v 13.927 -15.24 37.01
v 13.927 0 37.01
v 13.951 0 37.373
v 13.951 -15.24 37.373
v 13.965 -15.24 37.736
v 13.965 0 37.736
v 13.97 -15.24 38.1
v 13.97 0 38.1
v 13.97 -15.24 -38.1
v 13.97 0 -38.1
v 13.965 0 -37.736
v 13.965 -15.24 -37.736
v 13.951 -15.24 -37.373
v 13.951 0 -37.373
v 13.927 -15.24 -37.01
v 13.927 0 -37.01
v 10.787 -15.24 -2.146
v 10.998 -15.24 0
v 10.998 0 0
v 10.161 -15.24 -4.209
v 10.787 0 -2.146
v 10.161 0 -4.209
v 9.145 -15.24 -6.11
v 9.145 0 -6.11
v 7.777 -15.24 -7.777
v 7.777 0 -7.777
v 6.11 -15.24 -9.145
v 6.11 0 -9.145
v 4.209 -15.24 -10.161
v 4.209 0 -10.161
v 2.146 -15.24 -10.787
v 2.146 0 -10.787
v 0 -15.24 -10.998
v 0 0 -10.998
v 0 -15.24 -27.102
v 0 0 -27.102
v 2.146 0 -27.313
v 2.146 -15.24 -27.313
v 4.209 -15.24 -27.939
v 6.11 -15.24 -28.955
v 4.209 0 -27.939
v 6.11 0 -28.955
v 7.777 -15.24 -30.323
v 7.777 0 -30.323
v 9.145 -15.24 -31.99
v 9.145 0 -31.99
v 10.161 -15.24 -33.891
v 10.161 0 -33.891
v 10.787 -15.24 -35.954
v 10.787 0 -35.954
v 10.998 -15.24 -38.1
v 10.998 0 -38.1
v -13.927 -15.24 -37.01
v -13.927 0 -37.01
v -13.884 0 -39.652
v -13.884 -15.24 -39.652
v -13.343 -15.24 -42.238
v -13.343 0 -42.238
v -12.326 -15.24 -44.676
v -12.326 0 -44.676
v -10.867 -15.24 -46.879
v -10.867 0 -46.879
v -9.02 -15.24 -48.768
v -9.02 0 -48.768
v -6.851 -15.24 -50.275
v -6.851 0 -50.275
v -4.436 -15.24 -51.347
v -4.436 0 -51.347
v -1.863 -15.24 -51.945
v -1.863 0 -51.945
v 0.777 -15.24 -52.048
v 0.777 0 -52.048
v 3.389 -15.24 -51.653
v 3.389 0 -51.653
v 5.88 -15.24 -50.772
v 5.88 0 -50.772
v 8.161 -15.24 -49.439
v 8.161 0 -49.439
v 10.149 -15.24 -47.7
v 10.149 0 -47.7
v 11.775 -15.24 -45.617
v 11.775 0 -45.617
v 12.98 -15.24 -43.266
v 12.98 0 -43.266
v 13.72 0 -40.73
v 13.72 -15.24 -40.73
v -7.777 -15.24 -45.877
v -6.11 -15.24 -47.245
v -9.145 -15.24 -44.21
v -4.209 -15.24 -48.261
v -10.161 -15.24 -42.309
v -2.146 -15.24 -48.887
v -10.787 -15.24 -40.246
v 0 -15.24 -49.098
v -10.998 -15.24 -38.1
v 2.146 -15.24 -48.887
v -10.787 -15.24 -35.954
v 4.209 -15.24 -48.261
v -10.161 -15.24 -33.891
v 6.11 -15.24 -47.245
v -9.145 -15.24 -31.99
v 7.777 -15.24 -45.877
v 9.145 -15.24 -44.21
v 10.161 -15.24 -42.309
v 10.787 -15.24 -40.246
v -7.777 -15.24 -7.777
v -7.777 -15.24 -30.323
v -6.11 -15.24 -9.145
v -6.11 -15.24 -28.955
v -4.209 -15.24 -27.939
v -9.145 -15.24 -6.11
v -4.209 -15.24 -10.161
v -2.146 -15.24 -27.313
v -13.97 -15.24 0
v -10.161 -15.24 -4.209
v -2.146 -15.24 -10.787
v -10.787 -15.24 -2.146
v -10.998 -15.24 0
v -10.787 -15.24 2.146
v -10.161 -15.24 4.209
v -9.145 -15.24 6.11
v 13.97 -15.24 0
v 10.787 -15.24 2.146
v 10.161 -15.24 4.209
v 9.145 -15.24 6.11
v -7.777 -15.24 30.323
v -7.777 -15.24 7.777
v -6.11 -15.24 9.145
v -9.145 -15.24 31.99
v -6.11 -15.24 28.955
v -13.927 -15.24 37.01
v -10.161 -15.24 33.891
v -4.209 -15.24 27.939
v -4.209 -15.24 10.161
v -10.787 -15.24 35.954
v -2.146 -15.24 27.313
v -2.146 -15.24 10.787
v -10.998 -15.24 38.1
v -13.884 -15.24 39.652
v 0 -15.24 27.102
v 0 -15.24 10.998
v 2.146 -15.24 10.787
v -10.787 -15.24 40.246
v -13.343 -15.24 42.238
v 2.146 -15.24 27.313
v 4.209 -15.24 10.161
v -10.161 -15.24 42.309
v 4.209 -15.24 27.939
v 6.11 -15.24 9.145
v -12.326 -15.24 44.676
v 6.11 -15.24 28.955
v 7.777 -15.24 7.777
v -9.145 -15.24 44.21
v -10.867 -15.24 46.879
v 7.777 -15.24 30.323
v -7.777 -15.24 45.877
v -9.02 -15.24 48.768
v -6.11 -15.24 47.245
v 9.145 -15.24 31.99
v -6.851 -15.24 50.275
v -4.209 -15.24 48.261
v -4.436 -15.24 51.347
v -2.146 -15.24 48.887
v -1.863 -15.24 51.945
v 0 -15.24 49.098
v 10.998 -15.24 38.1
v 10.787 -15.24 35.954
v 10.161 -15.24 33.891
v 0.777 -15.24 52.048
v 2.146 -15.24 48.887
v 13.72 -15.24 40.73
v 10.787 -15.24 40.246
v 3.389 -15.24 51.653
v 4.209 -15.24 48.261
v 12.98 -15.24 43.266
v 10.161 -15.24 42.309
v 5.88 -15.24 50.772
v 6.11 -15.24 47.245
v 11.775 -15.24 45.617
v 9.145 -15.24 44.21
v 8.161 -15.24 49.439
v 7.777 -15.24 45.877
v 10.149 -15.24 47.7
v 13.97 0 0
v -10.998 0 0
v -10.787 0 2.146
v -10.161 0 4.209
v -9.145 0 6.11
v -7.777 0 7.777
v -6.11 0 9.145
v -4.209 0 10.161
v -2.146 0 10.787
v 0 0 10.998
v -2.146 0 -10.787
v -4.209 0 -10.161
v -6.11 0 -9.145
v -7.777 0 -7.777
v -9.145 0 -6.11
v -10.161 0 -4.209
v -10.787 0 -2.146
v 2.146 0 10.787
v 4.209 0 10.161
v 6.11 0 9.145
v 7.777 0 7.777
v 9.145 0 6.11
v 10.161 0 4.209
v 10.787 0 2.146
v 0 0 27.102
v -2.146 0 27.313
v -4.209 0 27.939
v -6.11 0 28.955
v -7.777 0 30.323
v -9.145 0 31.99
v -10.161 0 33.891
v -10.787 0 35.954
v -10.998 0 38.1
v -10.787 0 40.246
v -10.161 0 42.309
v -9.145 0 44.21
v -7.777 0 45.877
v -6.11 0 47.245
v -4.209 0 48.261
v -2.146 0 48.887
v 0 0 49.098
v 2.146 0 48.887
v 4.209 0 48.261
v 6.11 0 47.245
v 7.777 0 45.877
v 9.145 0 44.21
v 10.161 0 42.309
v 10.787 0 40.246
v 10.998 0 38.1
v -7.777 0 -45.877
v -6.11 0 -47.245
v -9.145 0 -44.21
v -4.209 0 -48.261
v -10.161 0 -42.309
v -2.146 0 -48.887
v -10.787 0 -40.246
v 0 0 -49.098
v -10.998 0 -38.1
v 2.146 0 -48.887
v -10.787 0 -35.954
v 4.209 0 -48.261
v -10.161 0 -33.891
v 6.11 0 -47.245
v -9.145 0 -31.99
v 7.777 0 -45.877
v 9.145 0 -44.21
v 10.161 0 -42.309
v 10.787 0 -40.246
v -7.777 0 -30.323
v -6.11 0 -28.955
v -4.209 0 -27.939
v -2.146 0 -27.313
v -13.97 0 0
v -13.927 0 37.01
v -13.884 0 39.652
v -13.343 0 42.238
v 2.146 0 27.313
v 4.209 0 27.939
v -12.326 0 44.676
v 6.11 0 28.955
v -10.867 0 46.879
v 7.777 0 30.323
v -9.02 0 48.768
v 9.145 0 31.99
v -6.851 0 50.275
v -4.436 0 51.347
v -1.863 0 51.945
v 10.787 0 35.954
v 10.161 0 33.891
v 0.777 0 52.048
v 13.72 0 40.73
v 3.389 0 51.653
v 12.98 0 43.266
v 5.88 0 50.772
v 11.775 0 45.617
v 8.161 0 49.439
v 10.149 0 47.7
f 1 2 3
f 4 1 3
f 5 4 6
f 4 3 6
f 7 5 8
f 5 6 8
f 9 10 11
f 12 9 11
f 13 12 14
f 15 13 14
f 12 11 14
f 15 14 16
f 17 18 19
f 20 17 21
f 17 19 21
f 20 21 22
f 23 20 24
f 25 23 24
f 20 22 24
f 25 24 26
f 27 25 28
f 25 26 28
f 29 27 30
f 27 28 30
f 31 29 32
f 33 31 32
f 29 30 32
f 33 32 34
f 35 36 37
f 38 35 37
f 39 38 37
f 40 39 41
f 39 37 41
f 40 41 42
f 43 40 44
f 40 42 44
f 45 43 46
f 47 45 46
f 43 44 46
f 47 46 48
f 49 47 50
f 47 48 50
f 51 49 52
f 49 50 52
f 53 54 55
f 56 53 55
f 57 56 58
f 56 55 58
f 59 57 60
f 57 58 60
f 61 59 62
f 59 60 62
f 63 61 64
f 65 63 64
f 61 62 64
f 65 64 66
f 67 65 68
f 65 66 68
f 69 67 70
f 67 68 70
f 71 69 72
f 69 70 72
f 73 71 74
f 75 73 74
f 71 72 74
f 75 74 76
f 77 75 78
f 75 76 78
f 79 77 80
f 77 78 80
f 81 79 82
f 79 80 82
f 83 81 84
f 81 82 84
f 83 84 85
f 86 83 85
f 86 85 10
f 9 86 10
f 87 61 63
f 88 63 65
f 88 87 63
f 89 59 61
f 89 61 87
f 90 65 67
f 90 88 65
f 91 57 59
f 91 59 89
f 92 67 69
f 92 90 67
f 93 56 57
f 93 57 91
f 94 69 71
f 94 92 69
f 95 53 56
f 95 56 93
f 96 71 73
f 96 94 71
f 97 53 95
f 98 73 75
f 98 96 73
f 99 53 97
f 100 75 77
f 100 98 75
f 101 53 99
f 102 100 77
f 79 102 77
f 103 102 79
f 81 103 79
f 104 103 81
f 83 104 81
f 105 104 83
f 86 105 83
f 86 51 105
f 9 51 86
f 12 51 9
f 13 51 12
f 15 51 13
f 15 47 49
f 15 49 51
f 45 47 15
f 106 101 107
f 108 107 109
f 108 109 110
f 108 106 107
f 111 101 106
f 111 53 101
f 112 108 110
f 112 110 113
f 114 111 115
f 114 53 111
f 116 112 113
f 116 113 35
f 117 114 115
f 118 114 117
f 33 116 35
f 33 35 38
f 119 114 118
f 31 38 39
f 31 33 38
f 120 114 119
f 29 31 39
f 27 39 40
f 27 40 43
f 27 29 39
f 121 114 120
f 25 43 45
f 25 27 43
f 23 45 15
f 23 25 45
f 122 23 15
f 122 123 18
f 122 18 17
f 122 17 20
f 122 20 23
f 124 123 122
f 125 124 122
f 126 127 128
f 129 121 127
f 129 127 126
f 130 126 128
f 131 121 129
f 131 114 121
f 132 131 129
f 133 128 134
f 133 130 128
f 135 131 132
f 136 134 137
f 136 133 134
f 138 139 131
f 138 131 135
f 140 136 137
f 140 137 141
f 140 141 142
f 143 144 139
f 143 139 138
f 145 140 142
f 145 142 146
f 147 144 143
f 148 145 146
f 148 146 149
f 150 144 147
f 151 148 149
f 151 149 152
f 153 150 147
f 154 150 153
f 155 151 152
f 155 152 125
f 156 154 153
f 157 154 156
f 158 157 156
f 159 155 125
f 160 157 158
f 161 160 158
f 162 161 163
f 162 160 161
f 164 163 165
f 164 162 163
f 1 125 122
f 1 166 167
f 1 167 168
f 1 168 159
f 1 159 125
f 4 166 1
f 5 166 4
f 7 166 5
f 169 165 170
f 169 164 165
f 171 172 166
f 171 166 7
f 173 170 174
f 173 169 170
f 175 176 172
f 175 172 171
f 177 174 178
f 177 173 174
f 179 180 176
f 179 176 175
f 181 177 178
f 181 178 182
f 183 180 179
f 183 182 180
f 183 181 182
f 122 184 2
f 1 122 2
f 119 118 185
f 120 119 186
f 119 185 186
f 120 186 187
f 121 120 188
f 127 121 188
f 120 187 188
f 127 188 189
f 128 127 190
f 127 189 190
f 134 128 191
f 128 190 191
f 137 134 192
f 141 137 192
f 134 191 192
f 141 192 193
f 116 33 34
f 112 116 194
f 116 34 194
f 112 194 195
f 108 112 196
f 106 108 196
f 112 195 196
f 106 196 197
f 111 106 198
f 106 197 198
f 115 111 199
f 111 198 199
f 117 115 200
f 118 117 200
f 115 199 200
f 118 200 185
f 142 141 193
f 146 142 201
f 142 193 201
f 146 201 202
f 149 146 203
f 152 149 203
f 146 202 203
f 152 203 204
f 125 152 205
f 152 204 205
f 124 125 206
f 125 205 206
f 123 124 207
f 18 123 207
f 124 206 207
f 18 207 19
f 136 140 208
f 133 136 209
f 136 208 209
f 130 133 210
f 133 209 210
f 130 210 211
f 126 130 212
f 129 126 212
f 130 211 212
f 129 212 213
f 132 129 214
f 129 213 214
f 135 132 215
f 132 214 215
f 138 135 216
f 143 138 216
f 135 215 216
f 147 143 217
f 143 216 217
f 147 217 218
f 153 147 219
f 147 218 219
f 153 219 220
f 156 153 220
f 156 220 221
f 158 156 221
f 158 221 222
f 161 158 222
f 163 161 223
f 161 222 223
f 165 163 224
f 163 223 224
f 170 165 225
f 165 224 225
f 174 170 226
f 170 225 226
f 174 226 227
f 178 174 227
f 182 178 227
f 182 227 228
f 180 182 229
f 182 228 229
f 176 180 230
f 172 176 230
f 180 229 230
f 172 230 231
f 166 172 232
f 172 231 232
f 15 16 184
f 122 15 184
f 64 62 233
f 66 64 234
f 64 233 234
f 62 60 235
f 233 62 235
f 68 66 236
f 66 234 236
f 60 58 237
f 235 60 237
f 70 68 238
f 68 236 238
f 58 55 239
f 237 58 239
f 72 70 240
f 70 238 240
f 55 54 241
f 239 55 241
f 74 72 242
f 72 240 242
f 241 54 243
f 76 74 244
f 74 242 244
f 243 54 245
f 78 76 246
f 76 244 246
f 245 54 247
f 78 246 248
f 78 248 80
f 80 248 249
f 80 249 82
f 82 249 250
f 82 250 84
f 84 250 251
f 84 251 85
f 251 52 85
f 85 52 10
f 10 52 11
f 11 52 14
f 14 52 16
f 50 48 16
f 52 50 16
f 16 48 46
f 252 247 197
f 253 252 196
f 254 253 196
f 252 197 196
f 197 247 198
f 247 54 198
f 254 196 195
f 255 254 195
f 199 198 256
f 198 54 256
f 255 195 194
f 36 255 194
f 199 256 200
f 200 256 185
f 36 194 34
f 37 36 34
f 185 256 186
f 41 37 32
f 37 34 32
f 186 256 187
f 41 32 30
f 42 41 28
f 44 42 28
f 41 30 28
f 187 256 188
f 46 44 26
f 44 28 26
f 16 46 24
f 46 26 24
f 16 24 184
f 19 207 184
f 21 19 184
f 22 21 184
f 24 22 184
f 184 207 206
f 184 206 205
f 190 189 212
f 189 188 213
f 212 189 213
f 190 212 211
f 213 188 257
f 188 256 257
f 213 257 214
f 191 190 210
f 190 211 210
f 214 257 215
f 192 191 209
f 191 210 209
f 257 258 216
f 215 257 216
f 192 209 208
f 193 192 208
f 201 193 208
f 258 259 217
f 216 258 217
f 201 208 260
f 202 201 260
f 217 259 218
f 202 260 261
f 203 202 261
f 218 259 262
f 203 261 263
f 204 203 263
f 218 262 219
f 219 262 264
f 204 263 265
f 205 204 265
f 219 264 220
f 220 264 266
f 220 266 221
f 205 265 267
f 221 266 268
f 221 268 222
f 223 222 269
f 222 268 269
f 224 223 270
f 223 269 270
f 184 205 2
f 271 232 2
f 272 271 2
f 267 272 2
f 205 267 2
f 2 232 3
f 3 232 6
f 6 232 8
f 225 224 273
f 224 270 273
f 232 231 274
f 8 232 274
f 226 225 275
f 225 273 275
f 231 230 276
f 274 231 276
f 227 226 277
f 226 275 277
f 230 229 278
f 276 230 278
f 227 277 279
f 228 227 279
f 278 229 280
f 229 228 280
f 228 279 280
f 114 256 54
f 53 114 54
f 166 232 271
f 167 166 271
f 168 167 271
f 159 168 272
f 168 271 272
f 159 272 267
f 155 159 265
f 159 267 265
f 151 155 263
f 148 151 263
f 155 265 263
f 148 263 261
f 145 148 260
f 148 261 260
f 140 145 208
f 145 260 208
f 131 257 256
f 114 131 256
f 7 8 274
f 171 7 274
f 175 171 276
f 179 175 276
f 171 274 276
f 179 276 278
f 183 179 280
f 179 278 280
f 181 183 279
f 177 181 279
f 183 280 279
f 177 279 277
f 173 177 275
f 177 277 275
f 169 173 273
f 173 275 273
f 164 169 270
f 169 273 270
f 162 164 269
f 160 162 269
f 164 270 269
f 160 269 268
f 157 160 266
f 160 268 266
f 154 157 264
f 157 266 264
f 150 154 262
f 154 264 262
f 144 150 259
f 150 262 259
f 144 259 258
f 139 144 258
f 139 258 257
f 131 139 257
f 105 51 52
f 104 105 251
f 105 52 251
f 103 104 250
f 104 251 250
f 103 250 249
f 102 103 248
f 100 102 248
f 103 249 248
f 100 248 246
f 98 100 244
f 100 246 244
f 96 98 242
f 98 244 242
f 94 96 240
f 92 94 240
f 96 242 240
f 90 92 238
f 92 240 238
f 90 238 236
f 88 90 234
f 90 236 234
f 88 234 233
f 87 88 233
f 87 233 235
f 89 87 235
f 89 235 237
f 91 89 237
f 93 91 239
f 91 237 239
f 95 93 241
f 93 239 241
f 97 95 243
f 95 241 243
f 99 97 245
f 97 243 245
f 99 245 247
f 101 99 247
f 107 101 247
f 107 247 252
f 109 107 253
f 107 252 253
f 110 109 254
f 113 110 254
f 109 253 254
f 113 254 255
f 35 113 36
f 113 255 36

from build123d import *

# Parameters (mm, degrees)
F1_DEPTH = 15.24


with BuildPart() as f1:
    # F0 (on Front) → F1 (new body)
    with BuildSketch(Plane.XZ):
        with BuildLine():
            ThreePointArc((-10.9982, 0), (-7.776902, 7.776902), (0, 10.9982))
            Line((0, 10.9982), (0, 24.13))
            ThreePointArc((0, 24.13), (-9.485208, 27.843698), (-13.927438, 37.01034))
            Line((-13.927438, 37.01034), (-13.97, 0))
            Line((-13.97, 0), (-10.9982, 0))
        make_face()
        with BuildLine():
            Line((0, 24.13), (0, 10.9982))
            ThreePointArc((0, 10.9982), (7.776902, 7.776902), (10.9982, 0))
            Line((10.9982, 0), (13.97, 0))
            Line((13.97, 0), (13.927438, 37.01034))
            ThreePointArc((13.927438, 37.01034), (9.485208, 27.843698), (0, 24.13))
        make_face()
        with BuildLine():
            Line((0, -24.13), (0, -10.9982))
            ThreePointArc((0, -10.9982), (-7.776902, -7.776902), (-10.9982, 0))
            Line((-10.9982, 0), (-13.97, 0))
            Line((-13.97, 0), (-13.927438, -37.01034))
            ThreePointArc((-13.927438, -37.01034), (-9.485208, -27.843698), (0, -24.13))
        make_face()
        with BuildLine():
            ThreePointArc((10.9982, 0), (7.776902, -7.776902), (0, -10.9982))
            Line((0, -10.9982), (0, -24.13))
            ThreePointArc((0, -24.13), (9.485208, -27.843698), (13.927438, -37.01034))
            Line((13.927438, -37.01034), (13.97, 0))
            Line((13.97, 0), (10.9982, 0))
        make_face()
        with BuildLine():
            ThreePointArc((10.9982, 38.1), (-7.776902, 45.876902), (0, 27.1018))
            ThreePointArc((0, 27.1018), (7.776902, 30.323098), (10.9982, 38.1))
        make_face()
        with BuildLine():
            ThreePointArc((-13.927438, 37.01034), (-9.485208, 27.843698), (0, 24.13))
            ThreePointArc((0, 24.13), (9.485208, 27.843698), (13.927438, 37.01034))
            ThreePointArc((13.927438, 37.01034), (13.959356, 37.554755), (13.97, 38.1))
            ThreePointArc((13.97, 38.1), (-0.545245, 52.059356), (-13.927438, 37.01034))
        make_face()
        with BuildLine():
            ThreePointArc((10.9982, 38.1), (7.776902, 30.323098), (0, 27.1018))
            ThreePointArc((0, 27.1018), (-7.776902, 45.876902), (10.9982, 38.1))
        make_face(mode=Mode.SUBTRACT)
        with BuildLine():
            ThreePointArc((10.9982, -38.1), (7.776902, -30.323098), (0, -27.1018))
            ThreePointArc((0, -27.1018), (-7.776902, -45.876902), (10.9982, -38.1))
        make_face()
        with BuildLine():
            ThreePointArc((13.927438, -37.01034), (9.485208, -27.843698), (0, -24.13))
            ThreePointArc((0, -24.13), (-9.485208, -27.843698), (-13.927438, -37.01034))
            ThreePointArc((-13.927438, -37.01034), (-0.545245, -52.059356), (13.97, -38.1))
            ThreePointArc((13.97, -38.1), (13.959356, -37.554755), (13.927438, -37.01034))
        make_face()
        with BuildLine():
            ThreePointArc((10.9982, -38.1), (-7.776902, -45.876902), (0, -27.1018))
            ThreePointArc((0, -27.1018), (7.776902, -30.323098), (10.9982, -38.1))
        make_face(mode=Mode.SUBTRACT)
    extrude(amount=F1_DEPTH)


solid = f1.part
